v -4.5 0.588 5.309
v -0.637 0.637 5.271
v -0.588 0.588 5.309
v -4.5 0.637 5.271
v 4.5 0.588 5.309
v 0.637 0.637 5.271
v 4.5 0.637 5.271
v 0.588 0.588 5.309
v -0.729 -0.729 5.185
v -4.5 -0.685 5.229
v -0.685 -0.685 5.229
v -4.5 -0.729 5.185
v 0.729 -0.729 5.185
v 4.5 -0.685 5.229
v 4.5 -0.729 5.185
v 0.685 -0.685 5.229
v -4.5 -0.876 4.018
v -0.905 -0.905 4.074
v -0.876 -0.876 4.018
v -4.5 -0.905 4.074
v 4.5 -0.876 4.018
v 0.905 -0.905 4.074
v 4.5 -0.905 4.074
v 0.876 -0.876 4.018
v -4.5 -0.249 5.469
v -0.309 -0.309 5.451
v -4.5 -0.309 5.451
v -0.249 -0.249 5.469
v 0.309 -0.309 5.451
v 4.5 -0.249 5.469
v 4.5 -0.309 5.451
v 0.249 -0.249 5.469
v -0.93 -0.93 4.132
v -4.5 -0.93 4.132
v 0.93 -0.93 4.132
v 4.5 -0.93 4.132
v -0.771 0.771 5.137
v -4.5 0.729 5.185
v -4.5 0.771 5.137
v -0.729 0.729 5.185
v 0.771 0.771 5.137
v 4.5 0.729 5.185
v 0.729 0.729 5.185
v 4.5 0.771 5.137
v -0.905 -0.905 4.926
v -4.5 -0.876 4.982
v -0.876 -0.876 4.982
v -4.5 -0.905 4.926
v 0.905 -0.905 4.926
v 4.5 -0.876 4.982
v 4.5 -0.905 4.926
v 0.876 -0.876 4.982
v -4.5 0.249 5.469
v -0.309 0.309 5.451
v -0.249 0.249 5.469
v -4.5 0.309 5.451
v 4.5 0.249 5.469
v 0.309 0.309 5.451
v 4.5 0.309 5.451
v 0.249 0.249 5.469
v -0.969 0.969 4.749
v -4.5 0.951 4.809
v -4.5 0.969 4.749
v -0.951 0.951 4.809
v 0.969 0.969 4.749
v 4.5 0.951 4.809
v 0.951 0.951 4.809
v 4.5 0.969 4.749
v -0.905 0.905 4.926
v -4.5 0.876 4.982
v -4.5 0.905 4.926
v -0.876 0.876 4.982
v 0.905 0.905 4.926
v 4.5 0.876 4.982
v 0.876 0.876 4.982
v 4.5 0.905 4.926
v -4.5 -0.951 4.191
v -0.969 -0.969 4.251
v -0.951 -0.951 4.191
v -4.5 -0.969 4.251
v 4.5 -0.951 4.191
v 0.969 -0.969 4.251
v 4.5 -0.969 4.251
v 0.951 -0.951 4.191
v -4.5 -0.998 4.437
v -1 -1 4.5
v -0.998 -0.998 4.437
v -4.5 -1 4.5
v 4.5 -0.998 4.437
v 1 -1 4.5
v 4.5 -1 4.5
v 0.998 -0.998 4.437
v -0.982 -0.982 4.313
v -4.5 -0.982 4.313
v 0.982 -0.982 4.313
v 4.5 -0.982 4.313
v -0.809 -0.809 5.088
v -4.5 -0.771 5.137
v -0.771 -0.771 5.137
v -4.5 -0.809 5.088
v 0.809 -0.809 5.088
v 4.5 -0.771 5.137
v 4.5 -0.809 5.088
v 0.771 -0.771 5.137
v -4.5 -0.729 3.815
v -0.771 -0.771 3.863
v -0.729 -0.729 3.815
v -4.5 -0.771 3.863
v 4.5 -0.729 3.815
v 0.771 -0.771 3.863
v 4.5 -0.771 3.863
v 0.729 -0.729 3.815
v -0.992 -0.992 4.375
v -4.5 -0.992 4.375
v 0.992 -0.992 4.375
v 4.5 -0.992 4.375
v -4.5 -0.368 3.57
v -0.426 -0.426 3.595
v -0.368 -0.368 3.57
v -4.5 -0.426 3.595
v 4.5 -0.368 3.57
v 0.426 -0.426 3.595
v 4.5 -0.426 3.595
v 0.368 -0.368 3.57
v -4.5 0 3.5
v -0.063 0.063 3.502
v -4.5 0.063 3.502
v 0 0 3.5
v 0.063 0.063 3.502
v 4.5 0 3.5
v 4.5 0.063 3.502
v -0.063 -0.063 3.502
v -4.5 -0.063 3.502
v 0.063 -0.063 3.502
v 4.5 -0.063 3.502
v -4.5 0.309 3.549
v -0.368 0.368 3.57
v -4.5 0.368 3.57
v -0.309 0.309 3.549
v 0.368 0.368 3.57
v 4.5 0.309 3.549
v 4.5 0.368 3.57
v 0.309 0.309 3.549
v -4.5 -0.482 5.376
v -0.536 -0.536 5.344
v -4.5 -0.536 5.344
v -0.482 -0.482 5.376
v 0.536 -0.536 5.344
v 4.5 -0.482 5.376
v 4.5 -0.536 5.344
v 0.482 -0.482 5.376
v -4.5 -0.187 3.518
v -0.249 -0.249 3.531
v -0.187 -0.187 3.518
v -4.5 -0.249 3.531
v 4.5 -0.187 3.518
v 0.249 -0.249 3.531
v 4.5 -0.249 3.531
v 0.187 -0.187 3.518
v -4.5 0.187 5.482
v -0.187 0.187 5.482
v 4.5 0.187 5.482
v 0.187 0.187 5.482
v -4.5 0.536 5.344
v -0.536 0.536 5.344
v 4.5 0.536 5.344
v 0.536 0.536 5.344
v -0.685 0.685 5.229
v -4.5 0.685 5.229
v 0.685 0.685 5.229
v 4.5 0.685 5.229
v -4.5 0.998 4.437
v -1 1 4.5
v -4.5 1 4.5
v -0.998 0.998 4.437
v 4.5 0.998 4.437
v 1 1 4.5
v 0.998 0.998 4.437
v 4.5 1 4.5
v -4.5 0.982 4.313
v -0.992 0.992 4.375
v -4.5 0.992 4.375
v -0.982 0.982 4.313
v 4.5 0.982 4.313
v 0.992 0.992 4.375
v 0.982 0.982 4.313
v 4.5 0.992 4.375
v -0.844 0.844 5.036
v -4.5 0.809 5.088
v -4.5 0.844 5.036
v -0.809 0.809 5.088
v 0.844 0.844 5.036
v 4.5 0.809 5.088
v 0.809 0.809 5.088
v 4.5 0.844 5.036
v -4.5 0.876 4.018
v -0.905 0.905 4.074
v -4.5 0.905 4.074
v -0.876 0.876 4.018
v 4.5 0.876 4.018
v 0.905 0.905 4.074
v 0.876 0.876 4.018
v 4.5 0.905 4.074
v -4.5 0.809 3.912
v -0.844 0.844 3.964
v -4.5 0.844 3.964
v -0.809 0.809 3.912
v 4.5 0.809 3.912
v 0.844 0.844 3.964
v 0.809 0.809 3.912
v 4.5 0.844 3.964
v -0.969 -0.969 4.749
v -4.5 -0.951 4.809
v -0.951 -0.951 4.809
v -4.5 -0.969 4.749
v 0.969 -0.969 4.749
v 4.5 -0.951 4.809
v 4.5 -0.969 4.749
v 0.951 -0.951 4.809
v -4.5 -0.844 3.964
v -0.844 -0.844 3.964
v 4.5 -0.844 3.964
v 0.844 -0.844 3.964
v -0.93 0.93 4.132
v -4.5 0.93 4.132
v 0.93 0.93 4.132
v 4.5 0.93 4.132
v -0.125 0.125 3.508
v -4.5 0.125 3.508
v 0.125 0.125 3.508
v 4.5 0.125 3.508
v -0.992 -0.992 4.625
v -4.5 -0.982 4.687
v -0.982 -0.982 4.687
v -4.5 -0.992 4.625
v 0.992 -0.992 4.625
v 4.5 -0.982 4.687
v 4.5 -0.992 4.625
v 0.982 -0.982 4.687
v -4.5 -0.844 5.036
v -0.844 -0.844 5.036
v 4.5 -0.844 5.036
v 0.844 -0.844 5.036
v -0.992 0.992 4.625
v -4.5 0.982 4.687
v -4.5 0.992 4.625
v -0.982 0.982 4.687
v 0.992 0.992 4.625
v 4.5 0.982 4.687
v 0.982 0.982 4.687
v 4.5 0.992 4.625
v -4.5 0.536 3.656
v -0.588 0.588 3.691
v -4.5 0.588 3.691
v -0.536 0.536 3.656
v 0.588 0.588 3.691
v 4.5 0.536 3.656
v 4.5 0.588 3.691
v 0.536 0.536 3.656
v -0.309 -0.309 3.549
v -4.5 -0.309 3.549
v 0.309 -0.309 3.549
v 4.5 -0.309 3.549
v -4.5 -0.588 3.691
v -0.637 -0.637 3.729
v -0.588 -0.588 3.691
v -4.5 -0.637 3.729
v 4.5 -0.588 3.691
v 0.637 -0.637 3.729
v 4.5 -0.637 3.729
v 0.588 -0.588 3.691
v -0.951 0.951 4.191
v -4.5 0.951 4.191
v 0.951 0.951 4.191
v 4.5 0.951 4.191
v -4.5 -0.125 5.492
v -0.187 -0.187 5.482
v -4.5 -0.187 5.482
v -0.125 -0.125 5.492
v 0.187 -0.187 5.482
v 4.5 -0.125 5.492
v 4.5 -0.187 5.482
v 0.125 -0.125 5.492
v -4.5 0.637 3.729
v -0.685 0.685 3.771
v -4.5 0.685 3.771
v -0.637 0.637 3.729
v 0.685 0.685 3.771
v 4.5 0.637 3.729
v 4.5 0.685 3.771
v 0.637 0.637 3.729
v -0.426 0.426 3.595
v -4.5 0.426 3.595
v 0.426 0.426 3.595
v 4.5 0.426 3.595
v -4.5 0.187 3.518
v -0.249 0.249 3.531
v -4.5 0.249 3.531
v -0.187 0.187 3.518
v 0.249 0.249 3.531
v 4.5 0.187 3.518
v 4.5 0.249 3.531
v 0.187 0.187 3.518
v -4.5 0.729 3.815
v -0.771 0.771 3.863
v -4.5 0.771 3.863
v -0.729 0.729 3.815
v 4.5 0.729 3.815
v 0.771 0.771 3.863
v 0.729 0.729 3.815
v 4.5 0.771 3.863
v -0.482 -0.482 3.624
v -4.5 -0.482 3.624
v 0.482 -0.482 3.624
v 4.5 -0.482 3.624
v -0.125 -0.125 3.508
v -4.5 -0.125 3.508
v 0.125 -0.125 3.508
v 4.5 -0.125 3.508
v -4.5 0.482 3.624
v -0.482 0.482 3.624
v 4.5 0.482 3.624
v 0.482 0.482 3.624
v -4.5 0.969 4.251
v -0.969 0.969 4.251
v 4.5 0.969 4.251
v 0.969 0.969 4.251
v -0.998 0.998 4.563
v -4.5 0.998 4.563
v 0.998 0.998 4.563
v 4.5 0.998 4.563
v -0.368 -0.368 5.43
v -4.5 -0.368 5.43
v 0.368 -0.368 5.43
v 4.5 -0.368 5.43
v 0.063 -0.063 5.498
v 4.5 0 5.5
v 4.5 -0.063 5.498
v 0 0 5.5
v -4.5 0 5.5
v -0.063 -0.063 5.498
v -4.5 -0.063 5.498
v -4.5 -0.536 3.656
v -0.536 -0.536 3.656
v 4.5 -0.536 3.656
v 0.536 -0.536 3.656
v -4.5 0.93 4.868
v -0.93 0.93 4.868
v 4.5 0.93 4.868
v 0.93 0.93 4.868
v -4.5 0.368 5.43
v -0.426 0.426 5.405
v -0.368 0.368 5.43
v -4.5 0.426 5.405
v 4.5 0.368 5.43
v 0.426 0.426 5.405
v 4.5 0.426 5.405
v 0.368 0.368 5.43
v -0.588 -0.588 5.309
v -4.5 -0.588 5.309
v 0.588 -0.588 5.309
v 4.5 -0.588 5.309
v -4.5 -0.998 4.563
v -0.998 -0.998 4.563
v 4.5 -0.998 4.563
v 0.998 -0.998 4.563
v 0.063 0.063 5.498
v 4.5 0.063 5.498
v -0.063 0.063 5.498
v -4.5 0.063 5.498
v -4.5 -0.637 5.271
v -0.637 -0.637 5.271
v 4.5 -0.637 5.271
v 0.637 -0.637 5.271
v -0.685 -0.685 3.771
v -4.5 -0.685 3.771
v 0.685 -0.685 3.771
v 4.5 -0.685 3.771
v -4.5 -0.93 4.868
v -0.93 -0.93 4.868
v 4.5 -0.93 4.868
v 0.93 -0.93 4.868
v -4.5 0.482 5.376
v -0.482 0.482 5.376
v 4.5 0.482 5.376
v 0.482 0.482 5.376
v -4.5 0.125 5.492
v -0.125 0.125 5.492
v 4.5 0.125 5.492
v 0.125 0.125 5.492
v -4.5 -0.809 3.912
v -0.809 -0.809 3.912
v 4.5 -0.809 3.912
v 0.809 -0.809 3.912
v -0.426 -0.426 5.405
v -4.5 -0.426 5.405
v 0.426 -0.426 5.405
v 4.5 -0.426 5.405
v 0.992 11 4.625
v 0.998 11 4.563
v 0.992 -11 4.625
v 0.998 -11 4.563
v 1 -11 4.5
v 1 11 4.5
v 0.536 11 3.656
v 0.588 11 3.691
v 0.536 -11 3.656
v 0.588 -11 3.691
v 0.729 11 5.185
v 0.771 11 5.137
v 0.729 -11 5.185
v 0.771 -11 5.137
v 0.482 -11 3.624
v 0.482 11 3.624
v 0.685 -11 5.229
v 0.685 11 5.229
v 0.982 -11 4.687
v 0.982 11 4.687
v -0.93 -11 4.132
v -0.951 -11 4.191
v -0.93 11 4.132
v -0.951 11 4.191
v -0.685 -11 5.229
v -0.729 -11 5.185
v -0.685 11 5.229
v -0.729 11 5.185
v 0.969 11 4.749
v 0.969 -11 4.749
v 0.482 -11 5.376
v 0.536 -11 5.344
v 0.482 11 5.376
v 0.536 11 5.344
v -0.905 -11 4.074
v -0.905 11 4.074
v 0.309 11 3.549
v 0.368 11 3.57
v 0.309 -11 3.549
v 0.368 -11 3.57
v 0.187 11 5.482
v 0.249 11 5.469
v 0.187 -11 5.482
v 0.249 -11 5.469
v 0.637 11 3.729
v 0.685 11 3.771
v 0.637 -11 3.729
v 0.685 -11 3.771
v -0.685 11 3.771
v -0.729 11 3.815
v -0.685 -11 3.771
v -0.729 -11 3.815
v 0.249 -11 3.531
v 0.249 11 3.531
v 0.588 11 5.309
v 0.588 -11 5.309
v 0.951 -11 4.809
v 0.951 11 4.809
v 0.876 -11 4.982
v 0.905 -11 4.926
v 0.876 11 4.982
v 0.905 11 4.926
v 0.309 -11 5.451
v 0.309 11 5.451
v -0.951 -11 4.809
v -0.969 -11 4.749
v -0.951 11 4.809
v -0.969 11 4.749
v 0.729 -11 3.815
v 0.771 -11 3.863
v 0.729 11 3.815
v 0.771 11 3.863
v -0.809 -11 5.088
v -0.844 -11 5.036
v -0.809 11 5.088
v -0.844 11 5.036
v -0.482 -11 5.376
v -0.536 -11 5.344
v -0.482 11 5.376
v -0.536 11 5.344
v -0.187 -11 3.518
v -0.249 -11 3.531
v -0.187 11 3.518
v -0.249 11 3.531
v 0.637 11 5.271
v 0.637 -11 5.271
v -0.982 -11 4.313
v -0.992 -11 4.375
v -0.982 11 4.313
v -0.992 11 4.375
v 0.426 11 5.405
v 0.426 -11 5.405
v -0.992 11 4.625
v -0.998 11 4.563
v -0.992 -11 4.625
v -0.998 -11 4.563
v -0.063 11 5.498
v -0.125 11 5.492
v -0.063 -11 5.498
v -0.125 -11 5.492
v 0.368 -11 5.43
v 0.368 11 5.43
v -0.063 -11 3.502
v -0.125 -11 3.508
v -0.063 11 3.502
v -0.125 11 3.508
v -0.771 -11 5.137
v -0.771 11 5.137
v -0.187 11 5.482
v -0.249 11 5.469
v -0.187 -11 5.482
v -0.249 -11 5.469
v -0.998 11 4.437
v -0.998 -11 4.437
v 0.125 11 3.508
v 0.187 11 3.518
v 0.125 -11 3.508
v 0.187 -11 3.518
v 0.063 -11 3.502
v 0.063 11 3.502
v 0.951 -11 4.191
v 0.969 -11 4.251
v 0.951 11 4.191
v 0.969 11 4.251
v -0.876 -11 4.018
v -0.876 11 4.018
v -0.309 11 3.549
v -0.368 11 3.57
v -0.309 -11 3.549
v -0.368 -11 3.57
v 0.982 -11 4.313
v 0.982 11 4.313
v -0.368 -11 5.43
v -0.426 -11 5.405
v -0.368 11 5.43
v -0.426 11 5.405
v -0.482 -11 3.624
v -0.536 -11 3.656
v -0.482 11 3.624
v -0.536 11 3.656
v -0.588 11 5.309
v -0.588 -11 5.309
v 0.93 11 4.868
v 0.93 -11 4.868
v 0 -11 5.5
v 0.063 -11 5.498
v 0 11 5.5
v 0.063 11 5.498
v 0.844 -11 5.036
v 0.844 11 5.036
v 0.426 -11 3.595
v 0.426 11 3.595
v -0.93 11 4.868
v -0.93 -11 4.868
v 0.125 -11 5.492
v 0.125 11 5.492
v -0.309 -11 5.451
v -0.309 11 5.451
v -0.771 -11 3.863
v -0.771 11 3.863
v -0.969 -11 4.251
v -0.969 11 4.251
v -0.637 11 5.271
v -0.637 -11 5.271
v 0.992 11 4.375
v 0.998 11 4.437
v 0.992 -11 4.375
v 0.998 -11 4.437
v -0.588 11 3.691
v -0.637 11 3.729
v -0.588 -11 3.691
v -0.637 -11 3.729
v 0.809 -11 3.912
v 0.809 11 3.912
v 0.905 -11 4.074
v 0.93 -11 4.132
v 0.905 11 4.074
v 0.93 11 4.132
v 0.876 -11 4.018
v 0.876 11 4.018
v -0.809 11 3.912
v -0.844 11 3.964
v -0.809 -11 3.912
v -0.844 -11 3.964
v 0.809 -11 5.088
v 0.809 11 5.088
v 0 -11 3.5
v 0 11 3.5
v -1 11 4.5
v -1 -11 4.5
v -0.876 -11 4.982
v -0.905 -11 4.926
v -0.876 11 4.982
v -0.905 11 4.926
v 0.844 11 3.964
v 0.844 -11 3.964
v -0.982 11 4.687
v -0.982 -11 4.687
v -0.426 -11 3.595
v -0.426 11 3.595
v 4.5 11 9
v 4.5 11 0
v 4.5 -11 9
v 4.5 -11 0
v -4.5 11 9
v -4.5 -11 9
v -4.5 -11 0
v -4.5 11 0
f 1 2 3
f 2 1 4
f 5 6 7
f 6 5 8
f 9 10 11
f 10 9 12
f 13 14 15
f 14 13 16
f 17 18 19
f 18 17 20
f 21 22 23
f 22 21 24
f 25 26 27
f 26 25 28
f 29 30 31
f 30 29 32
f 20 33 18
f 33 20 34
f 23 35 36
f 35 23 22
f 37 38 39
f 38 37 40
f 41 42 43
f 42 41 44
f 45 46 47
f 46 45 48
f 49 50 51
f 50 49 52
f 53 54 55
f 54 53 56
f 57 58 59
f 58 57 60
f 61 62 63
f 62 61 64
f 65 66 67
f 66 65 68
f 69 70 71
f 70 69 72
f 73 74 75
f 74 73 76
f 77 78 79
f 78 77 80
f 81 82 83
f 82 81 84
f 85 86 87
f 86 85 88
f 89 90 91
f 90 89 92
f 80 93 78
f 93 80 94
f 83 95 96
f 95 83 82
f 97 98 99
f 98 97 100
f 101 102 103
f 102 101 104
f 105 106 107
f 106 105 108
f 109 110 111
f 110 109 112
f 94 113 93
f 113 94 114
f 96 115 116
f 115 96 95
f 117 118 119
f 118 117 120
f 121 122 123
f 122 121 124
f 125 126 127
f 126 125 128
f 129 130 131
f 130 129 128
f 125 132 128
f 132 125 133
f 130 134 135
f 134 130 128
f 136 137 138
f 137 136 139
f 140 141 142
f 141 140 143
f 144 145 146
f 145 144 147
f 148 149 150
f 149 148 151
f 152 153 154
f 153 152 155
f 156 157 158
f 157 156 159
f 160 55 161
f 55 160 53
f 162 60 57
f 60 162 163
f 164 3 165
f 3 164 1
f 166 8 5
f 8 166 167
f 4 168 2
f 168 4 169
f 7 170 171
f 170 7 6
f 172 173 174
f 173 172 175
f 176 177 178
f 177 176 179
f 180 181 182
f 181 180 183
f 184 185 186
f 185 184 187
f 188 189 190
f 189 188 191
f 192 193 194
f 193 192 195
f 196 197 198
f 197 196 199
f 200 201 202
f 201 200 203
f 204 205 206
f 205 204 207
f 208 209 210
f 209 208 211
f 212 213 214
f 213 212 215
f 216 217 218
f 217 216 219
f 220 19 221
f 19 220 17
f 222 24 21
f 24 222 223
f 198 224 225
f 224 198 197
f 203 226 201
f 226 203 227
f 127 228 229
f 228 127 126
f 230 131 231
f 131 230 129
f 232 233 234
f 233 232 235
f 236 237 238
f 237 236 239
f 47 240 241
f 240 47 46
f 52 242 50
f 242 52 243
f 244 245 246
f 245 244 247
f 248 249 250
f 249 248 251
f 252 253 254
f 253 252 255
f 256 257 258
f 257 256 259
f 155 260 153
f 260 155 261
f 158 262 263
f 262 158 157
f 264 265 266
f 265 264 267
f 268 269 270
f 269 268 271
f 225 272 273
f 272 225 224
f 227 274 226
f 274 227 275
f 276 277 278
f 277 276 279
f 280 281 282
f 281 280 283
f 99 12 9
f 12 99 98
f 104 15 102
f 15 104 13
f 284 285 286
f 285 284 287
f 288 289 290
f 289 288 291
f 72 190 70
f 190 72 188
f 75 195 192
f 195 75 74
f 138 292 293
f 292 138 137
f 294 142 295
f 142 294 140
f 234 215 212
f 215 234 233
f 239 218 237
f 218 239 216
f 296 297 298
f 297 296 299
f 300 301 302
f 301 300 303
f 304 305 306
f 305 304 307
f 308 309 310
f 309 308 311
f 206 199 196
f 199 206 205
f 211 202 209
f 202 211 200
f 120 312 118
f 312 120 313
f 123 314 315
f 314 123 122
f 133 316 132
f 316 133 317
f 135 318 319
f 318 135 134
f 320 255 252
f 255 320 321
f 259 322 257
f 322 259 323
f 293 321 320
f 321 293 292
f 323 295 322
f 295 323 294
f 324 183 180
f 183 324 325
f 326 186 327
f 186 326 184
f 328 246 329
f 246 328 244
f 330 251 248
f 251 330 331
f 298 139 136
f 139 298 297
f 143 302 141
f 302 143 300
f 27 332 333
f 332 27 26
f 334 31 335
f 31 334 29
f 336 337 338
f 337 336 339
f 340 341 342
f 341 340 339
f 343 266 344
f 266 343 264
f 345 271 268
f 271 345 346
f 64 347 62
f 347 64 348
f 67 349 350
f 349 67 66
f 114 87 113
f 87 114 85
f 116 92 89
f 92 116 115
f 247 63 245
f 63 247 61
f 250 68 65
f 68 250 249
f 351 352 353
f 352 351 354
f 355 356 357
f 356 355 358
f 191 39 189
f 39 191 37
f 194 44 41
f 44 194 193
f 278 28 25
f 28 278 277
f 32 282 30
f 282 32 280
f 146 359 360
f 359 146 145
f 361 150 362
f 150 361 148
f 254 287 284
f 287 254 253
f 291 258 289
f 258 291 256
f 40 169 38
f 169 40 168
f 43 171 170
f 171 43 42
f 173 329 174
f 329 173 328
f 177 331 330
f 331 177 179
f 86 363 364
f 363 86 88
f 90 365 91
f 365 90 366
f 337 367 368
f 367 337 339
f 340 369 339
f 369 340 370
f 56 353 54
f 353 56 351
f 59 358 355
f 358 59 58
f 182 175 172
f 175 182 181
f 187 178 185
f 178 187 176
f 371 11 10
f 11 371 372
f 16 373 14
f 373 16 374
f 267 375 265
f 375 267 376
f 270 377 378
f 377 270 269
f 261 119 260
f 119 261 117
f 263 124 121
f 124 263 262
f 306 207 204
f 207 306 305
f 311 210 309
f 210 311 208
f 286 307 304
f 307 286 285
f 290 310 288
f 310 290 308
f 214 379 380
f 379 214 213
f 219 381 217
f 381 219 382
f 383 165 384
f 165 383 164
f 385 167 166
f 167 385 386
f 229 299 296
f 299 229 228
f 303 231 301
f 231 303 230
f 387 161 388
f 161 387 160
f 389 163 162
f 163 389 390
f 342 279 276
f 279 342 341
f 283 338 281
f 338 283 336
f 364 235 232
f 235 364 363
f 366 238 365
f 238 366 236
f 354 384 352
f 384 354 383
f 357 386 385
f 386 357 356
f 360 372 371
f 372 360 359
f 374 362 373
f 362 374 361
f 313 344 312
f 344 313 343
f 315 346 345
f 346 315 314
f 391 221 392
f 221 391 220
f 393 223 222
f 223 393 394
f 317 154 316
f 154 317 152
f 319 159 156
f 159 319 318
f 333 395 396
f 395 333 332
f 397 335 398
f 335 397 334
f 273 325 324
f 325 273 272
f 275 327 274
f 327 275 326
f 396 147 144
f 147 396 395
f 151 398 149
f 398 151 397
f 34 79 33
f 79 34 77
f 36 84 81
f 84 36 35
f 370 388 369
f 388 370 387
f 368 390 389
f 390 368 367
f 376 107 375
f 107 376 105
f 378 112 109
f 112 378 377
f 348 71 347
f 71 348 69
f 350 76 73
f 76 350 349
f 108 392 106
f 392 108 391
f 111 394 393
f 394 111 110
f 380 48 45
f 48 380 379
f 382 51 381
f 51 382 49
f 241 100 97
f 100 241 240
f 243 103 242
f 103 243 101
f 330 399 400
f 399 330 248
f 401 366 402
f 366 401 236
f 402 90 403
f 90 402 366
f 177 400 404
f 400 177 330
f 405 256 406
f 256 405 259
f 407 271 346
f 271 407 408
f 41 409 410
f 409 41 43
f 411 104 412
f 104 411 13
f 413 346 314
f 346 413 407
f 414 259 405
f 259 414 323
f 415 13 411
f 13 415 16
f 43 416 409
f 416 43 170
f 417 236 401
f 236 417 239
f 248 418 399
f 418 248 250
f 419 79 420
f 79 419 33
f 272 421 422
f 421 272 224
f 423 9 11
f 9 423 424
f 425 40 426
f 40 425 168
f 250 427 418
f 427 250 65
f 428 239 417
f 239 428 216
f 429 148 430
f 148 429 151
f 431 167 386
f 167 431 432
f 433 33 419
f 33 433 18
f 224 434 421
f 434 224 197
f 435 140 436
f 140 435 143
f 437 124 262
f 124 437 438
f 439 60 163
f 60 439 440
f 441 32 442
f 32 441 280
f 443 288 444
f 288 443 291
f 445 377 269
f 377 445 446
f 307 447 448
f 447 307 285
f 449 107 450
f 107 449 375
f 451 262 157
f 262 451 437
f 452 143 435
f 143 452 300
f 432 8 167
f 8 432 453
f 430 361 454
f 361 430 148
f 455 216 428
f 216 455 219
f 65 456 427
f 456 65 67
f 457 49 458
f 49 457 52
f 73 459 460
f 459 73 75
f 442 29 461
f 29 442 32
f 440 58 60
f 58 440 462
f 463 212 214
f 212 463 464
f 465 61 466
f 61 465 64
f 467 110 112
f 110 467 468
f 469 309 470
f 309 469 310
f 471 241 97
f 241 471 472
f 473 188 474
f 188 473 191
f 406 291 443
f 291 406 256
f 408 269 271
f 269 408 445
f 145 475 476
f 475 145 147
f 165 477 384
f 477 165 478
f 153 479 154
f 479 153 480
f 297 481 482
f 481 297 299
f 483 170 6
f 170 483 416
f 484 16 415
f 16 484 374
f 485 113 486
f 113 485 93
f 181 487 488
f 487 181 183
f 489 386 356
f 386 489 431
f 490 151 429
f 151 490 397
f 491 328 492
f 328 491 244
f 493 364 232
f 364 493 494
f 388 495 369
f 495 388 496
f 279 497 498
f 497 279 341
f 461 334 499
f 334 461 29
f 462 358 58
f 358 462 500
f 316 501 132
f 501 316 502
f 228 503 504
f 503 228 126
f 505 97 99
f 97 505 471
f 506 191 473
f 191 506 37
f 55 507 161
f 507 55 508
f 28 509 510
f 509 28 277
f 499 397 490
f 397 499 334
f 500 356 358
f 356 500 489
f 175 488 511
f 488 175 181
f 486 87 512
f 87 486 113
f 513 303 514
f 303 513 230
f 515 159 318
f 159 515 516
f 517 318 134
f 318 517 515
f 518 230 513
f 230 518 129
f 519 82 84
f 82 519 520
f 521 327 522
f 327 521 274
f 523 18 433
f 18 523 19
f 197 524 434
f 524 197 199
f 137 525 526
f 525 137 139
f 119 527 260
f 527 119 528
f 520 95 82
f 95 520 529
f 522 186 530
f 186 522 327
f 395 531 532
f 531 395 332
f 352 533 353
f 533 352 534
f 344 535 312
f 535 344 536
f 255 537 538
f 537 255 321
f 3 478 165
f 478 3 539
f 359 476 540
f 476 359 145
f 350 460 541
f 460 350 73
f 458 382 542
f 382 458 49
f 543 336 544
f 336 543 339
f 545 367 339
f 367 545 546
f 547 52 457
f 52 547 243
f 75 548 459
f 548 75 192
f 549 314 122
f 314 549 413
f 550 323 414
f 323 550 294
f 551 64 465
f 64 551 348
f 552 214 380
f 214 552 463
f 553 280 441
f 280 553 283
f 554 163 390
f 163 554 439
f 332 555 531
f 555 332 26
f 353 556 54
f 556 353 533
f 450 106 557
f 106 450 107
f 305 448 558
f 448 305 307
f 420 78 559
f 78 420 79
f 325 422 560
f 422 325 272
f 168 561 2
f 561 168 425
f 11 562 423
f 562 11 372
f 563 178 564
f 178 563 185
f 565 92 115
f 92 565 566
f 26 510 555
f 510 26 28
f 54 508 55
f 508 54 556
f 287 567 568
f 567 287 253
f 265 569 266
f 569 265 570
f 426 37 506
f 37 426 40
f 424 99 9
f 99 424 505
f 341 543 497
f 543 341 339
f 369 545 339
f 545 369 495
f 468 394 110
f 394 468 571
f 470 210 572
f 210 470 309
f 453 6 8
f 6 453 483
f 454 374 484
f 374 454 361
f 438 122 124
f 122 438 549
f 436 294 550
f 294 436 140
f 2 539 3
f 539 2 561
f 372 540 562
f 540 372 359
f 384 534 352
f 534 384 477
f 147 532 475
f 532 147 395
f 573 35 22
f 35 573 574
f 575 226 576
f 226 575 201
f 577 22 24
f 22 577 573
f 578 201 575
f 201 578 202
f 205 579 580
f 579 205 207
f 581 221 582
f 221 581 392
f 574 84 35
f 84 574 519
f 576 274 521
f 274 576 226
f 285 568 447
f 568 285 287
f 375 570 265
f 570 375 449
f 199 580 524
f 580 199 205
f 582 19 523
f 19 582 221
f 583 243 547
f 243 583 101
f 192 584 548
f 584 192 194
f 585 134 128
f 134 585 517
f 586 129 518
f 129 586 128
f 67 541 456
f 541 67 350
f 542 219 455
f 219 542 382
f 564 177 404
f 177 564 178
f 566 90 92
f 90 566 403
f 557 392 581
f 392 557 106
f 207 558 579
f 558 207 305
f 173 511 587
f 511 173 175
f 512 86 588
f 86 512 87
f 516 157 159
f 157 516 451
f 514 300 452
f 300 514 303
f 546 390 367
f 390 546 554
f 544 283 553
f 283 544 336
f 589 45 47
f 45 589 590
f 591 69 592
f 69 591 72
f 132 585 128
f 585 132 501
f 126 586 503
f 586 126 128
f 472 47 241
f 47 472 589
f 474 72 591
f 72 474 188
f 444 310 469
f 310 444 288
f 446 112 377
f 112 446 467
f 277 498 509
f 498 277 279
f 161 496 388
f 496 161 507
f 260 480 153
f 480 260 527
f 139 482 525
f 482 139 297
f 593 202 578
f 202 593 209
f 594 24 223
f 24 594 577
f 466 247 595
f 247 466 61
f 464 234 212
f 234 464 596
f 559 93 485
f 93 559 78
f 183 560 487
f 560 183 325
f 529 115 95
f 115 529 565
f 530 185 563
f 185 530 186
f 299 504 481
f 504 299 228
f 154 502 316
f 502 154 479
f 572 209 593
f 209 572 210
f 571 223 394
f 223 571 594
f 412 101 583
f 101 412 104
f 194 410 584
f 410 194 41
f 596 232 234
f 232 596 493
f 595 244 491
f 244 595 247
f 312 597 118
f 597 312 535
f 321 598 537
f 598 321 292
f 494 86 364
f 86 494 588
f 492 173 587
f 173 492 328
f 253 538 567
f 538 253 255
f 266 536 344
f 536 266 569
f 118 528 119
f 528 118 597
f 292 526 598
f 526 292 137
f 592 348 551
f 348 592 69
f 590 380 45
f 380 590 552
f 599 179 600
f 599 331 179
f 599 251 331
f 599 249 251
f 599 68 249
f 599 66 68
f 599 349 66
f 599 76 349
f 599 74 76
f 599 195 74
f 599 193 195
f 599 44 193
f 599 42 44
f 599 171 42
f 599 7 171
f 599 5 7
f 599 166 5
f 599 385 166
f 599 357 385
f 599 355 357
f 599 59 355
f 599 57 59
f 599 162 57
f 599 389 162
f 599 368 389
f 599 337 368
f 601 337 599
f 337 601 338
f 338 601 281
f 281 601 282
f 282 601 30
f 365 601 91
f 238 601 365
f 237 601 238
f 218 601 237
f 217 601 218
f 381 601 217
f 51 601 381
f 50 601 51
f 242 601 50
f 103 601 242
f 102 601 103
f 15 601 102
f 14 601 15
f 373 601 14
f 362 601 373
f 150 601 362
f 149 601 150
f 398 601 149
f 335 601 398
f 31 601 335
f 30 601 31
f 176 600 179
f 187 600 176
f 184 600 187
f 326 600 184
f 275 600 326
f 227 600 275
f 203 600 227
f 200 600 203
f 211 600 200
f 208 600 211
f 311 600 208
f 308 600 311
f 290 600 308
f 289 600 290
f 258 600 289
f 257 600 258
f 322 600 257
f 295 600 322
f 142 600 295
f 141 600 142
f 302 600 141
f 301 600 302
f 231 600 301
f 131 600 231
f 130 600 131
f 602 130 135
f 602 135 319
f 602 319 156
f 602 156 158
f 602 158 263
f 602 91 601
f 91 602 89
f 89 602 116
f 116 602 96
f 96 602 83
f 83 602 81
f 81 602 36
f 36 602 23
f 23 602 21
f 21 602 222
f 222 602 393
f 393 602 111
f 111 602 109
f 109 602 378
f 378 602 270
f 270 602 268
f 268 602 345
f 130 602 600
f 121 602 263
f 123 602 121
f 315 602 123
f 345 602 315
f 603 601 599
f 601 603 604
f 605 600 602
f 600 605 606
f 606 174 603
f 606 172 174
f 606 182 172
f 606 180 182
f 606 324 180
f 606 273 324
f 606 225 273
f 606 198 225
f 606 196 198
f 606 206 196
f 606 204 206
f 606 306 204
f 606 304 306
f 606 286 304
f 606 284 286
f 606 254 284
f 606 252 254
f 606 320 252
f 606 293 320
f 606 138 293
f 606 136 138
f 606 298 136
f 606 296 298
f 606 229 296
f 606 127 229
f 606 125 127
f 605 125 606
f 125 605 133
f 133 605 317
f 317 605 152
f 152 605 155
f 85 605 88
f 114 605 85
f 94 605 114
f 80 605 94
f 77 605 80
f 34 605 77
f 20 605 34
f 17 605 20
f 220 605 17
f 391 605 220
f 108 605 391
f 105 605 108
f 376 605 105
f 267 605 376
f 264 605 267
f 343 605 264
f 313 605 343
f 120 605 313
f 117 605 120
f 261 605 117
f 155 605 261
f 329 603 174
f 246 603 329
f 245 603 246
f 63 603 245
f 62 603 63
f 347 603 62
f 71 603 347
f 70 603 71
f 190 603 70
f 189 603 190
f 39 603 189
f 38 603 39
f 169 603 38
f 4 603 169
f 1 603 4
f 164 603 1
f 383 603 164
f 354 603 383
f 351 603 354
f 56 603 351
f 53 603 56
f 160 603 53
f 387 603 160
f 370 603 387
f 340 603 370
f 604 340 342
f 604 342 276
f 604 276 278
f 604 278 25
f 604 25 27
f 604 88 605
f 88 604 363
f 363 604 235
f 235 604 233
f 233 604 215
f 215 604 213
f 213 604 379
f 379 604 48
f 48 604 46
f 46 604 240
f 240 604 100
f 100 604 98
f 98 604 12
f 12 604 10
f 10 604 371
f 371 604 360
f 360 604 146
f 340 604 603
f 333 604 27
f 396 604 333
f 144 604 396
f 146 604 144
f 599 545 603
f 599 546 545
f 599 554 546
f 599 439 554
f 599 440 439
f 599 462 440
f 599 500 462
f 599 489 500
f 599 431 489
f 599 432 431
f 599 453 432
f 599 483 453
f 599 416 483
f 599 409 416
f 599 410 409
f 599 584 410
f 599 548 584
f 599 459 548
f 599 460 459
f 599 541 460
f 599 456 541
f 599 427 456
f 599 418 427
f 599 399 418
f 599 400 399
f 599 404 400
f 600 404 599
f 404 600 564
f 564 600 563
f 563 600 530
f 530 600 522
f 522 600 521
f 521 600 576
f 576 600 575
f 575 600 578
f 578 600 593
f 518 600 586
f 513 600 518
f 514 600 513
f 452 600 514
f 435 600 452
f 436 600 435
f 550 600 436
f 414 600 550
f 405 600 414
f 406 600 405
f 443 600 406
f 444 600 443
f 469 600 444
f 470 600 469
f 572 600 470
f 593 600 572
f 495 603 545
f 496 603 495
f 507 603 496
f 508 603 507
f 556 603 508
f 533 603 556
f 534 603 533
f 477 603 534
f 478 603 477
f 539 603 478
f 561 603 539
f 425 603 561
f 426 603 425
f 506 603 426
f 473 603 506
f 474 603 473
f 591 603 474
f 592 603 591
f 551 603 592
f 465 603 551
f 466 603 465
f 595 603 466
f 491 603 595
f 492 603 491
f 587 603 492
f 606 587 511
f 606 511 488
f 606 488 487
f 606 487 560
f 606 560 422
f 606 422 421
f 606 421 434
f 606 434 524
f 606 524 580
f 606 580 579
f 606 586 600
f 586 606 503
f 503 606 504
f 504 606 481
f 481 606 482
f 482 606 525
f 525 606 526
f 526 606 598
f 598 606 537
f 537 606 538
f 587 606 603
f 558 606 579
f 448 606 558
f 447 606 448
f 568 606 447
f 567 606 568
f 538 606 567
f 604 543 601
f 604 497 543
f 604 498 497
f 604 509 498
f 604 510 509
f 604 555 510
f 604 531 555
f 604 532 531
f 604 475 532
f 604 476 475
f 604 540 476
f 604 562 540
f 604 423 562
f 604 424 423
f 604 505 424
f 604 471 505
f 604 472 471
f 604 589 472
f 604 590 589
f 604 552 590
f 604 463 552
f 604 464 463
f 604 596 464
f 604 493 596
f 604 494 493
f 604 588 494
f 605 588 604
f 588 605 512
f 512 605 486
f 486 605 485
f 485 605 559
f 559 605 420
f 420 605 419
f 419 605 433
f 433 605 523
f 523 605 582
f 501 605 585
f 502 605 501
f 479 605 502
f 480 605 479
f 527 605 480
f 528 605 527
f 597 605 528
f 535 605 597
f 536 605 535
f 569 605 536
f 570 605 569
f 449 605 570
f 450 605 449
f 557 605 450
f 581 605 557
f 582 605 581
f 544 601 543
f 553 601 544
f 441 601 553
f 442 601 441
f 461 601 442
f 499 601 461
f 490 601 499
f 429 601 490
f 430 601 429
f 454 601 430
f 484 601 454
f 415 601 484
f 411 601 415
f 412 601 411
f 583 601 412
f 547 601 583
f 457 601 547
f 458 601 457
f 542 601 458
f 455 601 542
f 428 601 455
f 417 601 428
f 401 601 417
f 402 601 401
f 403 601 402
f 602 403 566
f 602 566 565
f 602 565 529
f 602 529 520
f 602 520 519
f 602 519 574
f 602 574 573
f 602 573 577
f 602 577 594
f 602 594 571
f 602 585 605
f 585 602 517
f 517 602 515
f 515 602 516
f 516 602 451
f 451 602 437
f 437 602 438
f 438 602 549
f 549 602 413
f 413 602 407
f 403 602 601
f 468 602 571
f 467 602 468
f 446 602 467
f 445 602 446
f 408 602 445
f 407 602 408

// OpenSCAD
difference(){
	union(){
        translate([-4.5,-22/2,0]){
           cube([9,22,9], center=false);
        }	   

 
	}
	union() {

       translate([0,0,4.5]){
            rotate(a = [0,90,0]) {
                cylinder(h=600, r=1.0, $fn=100, center=true);
            }
       }   
       translate([0,0,4.5]){
            rotate(a = [90,0,0]) {
                cylinder(h=600, r=1.0, $fn=100, center=true);
            }
       }   

        
	}
}
